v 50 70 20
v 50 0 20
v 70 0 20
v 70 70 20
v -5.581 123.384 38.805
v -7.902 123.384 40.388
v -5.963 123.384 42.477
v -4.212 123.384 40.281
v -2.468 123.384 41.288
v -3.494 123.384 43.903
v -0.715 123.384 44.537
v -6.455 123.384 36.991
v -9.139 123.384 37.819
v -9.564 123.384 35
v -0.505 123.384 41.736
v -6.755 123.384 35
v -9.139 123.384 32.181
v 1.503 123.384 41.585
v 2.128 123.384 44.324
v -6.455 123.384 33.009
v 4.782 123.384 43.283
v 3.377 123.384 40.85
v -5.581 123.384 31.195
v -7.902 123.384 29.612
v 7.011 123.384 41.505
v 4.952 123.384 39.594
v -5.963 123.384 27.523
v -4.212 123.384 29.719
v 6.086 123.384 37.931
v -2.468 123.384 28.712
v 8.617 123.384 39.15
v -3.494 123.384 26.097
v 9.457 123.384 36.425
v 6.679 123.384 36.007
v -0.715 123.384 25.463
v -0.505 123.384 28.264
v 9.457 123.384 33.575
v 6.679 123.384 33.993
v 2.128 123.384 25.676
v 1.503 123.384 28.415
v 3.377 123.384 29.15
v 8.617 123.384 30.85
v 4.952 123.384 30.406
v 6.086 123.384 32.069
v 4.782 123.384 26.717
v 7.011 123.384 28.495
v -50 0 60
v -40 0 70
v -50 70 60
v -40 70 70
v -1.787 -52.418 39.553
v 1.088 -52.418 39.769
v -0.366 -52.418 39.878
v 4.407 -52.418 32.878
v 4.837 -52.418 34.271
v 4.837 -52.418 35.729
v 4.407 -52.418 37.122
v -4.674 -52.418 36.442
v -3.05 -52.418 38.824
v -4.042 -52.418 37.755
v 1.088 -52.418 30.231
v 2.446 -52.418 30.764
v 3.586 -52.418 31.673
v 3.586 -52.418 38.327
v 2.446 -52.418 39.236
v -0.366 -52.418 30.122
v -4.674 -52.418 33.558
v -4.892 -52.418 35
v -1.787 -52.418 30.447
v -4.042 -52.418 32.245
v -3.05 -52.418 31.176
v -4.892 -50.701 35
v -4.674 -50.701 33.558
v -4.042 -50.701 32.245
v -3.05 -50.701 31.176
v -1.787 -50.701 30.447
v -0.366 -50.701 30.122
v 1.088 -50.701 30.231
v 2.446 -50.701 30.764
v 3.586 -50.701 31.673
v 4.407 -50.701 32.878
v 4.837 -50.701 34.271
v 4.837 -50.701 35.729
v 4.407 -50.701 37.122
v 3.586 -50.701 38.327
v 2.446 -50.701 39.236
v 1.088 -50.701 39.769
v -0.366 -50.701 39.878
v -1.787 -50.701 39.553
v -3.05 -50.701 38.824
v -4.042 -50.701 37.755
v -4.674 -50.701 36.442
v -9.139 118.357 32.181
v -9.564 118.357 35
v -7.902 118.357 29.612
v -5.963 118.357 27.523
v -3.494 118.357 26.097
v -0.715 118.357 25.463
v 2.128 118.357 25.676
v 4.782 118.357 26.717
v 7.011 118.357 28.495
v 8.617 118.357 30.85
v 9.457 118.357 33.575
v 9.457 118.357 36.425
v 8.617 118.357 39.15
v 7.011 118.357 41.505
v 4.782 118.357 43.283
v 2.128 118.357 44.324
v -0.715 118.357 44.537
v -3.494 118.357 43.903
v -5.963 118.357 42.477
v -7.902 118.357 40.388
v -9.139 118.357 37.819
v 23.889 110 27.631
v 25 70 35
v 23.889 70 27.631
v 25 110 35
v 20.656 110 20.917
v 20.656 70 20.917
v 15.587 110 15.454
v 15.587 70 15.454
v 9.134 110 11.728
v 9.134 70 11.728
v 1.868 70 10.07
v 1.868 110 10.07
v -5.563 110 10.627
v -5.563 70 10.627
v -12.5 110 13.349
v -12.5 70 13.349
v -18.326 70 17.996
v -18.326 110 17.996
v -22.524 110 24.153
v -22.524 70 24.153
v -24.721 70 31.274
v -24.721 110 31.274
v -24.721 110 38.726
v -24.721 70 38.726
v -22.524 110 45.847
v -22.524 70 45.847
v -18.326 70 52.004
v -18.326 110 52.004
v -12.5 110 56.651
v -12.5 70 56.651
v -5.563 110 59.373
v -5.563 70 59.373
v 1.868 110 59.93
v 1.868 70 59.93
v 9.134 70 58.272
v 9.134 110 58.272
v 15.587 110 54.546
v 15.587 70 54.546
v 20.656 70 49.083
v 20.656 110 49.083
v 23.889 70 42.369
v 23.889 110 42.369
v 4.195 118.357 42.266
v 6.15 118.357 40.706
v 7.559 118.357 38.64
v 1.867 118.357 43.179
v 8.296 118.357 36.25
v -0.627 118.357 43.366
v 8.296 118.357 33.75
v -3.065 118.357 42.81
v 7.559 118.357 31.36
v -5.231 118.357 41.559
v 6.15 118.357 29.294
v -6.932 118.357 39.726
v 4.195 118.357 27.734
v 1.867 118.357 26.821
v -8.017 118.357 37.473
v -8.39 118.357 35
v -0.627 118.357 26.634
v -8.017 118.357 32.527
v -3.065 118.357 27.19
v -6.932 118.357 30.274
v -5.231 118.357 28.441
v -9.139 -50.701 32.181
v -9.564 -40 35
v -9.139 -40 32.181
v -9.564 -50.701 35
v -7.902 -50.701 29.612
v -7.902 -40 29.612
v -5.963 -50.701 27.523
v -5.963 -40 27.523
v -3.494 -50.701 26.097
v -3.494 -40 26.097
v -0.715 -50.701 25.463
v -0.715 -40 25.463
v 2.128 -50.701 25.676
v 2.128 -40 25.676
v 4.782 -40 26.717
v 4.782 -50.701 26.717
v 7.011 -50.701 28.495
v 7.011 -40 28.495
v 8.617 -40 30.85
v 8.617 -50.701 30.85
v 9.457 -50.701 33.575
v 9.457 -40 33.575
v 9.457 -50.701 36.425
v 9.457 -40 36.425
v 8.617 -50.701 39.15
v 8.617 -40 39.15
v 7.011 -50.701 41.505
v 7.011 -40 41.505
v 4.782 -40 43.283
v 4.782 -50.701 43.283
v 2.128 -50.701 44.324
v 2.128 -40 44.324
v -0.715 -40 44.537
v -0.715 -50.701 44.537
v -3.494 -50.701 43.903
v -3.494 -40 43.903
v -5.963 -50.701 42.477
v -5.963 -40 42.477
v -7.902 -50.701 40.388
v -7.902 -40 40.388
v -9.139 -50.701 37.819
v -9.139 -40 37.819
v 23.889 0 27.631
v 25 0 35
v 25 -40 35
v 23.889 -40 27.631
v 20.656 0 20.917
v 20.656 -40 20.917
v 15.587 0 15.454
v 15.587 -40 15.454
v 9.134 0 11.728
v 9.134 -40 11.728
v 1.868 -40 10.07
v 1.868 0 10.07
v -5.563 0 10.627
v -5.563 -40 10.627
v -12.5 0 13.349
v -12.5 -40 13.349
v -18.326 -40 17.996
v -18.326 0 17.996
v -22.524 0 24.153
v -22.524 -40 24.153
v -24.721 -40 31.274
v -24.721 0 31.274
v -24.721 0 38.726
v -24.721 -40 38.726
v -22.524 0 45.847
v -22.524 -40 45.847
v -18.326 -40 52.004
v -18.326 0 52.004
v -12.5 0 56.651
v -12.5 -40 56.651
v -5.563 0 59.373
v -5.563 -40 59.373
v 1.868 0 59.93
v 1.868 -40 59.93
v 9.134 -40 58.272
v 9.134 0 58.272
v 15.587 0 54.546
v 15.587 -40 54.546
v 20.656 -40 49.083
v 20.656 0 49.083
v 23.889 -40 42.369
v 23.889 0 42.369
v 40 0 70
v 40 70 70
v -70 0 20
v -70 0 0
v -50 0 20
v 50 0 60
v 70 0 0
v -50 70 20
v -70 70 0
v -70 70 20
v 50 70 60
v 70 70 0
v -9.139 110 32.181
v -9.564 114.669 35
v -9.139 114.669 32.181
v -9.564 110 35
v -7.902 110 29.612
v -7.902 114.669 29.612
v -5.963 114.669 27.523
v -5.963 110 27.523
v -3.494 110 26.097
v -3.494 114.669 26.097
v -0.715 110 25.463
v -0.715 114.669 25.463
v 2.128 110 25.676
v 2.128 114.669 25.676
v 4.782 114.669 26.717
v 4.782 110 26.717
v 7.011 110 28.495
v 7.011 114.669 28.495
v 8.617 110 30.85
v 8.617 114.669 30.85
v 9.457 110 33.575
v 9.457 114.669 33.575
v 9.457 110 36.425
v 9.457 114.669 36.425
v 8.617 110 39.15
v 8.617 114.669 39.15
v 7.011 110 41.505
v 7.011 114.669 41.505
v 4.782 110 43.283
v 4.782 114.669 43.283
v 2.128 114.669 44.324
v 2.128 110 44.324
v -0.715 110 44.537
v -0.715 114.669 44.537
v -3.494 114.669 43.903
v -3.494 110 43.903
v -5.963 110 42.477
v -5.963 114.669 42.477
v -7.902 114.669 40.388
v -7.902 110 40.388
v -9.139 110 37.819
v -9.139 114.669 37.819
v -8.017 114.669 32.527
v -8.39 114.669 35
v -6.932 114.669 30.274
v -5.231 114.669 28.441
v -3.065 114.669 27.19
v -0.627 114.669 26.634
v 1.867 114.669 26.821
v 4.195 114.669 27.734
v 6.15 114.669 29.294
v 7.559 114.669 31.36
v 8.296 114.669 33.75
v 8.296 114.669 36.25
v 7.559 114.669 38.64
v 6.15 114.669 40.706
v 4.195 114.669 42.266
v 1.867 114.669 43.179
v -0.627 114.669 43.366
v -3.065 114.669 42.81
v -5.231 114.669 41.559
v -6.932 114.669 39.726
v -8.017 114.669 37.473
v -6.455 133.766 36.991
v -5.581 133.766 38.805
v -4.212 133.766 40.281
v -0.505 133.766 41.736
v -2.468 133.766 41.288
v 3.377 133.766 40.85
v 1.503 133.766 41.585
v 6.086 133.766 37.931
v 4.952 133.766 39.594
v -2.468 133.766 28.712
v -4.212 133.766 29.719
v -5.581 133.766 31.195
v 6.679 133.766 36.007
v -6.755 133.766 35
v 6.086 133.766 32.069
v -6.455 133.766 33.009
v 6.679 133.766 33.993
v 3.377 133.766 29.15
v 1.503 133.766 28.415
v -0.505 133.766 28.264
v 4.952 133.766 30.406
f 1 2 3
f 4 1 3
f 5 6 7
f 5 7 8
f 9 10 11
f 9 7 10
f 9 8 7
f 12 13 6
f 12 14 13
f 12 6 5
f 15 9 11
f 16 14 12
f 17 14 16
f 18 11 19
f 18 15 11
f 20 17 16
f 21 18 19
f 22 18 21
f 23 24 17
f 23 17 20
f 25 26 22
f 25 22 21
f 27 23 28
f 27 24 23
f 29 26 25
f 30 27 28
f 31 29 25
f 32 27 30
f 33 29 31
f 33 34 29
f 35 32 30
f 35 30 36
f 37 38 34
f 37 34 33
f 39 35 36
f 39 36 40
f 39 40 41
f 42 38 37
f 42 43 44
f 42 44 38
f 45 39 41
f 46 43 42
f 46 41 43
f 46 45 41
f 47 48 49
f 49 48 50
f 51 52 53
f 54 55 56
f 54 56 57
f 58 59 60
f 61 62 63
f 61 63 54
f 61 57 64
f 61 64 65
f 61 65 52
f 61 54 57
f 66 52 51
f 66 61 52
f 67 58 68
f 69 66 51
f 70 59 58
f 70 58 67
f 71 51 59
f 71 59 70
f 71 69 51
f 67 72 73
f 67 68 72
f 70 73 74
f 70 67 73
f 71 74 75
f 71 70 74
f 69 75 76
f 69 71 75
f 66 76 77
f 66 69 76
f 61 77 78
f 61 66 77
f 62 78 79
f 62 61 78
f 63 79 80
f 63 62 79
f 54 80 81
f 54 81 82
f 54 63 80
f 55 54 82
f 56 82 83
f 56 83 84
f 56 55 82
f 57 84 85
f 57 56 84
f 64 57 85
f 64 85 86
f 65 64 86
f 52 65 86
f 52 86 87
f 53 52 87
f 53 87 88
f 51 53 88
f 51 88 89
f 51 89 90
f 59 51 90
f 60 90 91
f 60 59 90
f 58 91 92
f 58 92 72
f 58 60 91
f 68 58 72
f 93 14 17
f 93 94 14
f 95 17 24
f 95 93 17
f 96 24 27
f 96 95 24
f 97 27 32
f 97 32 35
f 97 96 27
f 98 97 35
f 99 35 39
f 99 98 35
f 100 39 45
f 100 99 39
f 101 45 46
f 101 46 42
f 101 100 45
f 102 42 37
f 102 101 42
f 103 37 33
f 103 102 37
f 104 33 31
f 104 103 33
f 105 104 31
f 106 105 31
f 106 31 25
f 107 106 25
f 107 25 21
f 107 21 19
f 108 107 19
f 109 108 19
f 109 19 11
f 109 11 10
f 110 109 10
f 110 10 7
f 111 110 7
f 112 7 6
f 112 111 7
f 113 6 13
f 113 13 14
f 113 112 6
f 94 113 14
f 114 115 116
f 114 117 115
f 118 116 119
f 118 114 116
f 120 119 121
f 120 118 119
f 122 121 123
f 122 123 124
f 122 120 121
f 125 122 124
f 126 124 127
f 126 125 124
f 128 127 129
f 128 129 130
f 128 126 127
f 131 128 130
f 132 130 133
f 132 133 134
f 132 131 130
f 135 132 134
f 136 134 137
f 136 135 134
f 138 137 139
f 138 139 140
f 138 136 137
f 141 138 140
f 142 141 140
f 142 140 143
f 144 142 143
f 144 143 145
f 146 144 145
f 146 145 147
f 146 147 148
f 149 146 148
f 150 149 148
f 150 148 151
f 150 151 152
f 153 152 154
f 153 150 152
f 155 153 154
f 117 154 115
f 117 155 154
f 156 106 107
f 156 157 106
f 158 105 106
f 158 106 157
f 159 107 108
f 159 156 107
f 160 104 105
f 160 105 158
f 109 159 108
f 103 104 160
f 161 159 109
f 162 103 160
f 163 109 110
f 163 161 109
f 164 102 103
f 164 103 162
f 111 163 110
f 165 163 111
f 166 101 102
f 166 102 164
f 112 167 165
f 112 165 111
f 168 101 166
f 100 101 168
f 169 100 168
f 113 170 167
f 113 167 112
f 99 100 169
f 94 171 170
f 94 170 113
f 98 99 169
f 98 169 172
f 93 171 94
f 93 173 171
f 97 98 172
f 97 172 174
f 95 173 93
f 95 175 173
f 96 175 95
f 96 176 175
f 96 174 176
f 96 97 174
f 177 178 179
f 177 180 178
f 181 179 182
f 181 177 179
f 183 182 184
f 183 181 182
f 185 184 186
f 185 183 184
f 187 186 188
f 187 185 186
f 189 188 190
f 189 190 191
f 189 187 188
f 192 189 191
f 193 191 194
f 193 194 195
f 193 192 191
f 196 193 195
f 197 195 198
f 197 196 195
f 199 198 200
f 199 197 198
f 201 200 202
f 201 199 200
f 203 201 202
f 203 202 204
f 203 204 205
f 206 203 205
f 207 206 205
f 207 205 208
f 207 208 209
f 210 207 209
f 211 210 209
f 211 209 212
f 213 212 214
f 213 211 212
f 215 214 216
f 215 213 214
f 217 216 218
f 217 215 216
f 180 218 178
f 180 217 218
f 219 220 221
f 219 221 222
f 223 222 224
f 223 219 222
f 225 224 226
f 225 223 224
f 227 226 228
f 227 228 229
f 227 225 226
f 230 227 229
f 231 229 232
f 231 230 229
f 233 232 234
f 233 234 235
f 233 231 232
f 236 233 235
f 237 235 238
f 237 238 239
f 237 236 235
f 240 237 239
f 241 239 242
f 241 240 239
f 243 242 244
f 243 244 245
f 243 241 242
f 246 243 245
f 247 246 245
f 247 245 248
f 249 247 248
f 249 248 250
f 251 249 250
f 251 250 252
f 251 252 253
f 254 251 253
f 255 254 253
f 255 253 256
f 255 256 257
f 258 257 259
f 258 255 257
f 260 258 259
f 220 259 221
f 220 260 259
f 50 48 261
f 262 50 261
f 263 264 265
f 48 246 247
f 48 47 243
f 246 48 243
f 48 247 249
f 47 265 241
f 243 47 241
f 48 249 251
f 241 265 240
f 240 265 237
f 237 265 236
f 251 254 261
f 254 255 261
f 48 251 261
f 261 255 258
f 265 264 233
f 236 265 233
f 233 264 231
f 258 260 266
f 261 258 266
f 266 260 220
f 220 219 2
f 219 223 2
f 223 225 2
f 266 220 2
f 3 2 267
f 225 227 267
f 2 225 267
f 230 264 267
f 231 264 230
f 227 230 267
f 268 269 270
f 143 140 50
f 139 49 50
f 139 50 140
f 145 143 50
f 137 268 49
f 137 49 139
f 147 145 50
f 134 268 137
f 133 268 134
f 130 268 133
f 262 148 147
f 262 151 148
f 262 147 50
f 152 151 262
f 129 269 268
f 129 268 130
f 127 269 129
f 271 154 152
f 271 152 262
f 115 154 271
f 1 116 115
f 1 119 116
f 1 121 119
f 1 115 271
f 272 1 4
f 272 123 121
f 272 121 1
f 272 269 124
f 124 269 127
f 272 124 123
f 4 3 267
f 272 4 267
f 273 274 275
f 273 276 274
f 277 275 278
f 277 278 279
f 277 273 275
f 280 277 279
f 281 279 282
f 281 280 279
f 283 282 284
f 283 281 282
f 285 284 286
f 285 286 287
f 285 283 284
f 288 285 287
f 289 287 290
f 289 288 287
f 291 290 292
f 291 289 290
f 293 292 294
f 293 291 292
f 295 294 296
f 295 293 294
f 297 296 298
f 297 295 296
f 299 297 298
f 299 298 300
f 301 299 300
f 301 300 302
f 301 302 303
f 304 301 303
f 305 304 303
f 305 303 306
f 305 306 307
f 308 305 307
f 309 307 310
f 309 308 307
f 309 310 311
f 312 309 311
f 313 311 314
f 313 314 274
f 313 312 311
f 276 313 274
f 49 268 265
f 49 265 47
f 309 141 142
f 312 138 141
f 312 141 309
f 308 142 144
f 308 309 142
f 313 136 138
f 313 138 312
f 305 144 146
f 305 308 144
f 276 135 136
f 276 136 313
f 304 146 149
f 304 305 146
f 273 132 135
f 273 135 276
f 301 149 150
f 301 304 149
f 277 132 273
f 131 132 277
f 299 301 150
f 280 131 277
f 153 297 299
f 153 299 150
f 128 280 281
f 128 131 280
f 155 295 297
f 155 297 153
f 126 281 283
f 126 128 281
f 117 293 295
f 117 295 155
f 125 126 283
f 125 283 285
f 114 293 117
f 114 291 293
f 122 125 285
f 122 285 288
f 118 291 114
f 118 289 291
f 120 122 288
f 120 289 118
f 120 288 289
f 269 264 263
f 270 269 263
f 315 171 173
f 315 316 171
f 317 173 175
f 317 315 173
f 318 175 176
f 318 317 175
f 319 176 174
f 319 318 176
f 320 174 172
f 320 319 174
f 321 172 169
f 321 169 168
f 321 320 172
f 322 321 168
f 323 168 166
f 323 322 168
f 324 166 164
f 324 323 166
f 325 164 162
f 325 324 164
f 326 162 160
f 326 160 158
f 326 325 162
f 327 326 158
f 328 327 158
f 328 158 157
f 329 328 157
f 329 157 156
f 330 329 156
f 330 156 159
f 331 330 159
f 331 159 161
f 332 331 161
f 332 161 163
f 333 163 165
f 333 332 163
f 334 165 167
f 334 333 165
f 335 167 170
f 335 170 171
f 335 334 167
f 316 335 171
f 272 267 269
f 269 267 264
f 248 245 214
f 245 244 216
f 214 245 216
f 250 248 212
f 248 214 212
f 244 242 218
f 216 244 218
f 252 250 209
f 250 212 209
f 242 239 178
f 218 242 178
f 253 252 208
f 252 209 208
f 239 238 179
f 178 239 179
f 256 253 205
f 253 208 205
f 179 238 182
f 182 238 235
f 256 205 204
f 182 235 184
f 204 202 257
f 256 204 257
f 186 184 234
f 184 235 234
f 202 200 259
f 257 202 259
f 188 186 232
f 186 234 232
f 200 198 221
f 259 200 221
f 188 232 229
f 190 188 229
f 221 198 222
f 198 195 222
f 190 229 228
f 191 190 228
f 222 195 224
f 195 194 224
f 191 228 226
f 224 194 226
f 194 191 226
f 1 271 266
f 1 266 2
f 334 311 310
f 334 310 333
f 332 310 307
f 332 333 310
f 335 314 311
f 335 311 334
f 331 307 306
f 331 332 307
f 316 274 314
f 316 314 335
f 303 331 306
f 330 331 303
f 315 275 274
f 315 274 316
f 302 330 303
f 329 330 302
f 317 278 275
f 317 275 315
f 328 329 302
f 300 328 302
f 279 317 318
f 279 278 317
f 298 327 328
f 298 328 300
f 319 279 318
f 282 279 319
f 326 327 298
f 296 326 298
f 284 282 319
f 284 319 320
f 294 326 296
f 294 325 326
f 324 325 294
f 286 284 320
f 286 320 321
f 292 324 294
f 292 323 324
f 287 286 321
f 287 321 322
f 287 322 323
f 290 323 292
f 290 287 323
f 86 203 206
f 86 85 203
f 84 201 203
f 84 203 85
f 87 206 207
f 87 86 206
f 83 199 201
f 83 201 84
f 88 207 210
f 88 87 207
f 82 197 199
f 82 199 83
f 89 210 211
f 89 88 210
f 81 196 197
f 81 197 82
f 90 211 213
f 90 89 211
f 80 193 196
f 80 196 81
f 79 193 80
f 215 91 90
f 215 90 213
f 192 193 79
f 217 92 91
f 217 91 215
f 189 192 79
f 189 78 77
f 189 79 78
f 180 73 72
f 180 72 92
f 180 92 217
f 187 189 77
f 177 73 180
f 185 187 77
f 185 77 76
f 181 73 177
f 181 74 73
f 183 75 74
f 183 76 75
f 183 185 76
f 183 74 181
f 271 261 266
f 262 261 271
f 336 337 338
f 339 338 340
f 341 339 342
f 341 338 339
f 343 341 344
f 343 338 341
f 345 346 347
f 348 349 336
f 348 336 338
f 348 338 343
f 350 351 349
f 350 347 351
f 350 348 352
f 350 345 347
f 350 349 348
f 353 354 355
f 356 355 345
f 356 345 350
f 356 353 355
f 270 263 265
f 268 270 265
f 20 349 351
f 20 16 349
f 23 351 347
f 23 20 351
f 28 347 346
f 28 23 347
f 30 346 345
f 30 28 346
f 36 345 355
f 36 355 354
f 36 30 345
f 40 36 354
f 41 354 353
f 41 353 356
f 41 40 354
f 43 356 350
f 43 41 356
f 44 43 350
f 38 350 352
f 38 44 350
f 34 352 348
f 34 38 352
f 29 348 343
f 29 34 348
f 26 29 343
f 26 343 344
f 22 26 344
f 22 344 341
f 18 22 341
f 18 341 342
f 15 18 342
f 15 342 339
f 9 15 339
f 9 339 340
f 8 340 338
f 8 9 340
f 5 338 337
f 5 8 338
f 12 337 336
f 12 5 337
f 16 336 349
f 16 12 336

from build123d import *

# Parameters (mm, degrees)
SKETCH1_R           = 25
BOSS_EXTRUDE1_DEPTH = 70
SKETCH3_R           = 25
BOSS_EXTRUDE2_DEPTH = 75
CHAMFER1_SIZE       = 10


with BuildPart() as part:
    # Sketch1 → Boss-Extrude1 (new body)
    with BuildSketch(Plane(origin=(0, 0, 0), x_dir=(1, 0, 0), z_dir=(0, 1, 0))):
        Polygon((70, 0), (-70, 0), (-70, -20), (-50, -20), (-50, -70), (50, -70), (50, -20), (70, -20), align=None)
        with Locations((0, -35)):
            Circle(SKETCH1_R, mode=Mode.SUBTRACT)
    extrude(amount=BOSS_EXTRUDE1_DEPTH)

    # Sketch3 → Boss-Extrude2 (add, symmetric)
    with BuildSketch(Plane(origin=(0, 35, 0), x_dir=(1, 0, 0), z_dir=(0, 1, 0))):
        with Locations((0, -35)):
            Circle(SKETCH3_R)
    extrude(amount=BOSS_EXTRUDE2_DEPTH, both=True)

    # Sketch4 → Revolve1 (revolve)
    with BuildSketch(Plane.XY.offset(35)):
        Polygon((-9.564011188, 110), (0, 110), (0, 133.766089862), (-6.754803398, 133.766089862), (-6.754803398, 123.383600129), (-9.564011188, 123.383600129), (-9.564011188, 118.357377814), (-8.389537285, 118.357377814), (-8.389537285, 114.668590284), (-9.564011188, 114.668590284), align=None)
        Polygon((0, -40), (-9.564011188, -40), (-9.564011188, -50.700633695), (-4.891534663, -50.700633695), (-4.891534663, -52.417938892), (0, -52.417938892), align=None)
    revolve(axis=Axis((0, -40, 35), (0, -1, 0)))

    # Chamfer1
    chamfer1_edges = [part.edges().sort_by_distance(p)[0] for p in [
        (50, 35, 70),
        (-50, 35, 70),
    ]]
    chamfer(chamfer1_edges, length=CHAMFER1_SIZE)


solid = part.part
